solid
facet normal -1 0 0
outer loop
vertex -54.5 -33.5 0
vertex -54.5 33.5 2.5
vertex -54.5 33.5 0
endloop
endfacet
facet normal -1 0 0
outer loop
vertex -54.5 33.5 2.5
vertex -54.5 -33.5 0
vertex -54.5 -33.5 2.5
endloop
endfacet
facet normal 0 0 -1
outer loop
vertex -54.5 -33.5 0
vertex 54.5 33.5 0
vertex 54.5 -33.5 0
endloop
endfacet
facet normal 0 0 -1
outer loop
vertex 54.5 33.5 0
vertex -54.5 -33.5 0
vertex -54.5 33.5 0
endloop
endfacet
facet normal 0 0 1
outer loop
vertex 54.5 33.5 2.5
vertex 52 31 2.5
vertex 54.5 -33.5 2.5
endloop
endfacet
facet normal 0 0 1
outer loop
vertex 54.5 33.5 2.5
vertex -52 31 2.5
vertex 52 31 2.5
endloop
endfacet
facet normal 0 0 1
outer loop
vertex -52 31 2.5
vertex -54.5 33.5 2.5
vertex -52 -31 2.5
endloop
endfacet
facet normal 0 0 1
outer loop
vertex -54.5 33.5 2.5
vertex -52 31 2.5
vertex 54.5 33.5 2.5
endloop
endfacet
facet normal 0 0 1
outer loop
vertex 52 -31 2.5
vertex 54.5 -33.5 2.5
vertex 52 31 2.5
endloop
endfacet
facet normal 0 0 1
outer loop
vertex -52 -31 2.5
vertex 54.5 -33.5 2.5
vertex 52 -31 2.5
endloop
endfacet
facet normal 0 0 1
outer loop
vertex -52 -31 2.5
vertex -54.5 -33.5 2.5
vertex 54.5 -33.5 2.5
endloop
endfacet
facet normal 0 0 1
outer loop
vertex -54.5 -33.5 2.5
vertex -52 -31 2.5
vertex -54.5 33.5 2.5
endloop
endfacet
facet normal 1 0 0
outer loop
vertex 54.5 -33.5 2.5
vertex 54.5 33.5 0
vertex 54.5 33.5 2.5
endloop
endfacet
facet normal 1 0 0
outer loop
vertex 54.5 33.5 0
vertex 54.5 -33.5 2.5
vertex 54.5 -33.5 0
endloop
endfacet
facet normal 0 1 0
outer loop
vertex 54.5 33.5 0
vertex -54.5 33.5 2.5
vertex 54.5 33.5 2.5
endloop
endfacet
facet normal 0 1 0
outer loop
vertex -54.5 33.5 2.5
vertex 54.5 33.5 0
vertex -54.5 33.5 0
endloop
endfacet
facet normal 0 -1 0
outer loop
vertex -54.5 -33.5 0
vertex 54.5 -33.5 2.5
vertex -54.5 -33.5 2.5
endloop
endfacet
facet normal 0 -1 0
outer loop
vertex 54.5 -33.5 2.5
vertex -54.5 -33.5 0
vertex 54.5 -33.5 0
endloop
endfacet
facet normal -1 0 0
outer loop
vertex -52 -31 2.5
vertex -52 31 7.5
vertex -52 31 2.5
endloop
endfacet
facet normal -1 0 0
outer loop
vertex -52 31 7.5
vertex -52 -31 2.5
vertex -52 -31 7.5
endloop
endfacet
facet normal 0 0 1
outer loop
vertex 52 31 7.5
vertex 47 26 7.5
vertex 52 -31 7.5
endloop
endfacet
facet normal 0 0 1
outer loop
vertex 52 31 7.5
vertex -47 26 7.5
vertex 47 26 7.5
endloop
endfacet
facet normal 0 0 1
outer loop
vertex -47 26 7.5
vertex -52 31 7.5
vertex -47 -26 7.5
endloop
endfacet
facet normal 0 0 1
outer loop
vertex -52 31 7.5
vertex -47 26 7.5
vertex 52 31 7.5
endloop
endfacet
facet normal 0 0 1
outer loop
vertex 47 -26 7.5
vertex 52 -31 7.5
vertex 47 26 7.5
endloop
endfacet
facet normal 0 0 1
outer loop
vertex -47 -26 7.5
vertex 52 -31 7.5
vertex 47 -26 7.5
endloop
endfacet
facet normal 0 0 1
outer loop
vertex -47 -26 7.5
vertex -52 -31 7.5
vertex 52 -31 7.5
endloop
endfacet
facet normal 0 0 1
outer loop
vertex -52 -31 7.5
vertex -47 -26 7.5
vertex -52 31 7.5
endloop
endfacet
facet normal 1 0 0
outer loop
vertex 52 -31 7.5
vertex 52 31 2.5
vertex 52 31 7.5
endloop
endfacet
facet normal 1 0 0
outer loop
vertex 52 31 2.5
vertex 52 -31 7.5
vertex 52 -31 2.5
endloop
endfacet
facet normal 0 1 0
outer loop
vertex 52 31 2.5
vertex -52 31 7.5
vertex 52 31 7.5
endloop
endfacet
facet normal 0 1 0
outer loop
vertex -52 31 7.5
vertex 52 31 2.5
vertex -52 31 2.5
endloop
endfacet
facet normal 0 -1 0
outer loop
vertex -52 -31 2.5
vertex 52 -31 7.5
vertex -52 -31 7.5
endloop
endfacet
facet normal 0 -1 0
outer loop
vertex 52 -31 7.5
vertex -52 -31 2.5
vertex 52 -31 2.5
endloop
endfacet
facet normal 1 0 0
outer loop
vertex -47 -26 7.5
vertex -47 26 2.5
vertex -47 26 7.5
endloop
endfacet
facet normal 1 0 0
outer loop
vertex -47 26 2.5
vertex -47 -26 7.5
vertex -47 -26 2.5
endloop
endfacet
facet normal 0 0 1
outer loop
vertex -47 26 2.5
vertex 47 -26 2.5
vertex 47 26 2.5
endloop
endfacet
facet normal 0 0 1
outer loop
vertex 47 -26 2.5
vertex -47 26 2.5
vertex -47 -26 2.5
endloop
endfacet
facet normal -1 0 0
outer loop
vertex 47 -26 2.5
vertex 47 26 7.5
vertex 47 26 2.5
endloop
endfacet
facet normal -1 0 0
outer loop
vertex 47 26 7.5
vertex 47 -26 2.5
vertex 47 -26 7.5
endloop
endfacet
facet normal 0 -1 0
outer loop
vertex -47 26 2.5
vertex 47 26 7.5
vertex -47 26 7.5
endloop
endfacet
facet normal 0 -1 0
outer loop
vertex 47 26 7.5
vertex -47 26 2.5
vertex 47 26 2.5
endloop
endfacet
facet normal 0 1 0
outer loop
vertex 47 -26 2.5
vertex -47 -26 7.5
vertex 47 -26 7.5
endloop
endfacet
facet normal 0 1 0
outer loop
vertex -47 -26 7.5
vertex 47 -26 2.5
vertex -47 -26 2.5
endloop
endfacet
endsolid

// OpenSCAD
//*************************************
// Description:
// 
// A simple box for Lyre project
//
// Fabrication:
//
// print two half shells for one box
//
// Copyright CC-BY-SA Bob Cousins 2010
//
// Rev 2 add lid module
//*************************************

// assume all units are mm

//*************************************
// >>>>  Edit Parameters <<<<
 
// assume uniform wall thickness
wall = 2.5;

// inner dimenions
inner_x = 104;
inner_y = 62;
inner_z = 11;

// parameters for lid
lip_z = 5;
lip_width = 5;

//********* END ***********************


// Calculated dimensions
outer_x = inner_x + wall*2;
outer_y = inner_y + wall*2;
outer_z = inner_z + wall;

origin_x = outer_x / 2;
origin_y = outer_y / 2;
origin_z = 0;
//*************************************

// A simple U-shape tray
module box_shell()
{
	
    translate ([-origin_x, -origin_y, -origin_z])
    difference() 
    {
        cube([outer_x, outer_y, outer_z],
            center = false);

        translate ([wall,wall,wall]) 
            cube([inner_x, inner_y, inner_z+wall], 
                center = false);
    }
}

// A lid with lipped edge
module box_lid ()
{
	translate ([0,0,wall+lip_z])
	rotate ([0,180,0])
    translate ([-origin_x, -origin_y, -origin_z])
    
	difference() {

		union() {
		    translate ([0,0,lip_z])
	        cube([outer_x, outer_y, wall], center = false);
	
		    translate ([wall,wall,0])
	        cube([inner_x, inner_y, lip_z+wall/2], center = false);
		}

		translate ([wall+lip_width, wall+lip_width, -wall/2])
	        cube([inner_x - lip_width*2, 
                  inner_y - lip_width*2, 
                  lip_z+wall/2], center = false);

		
	}
}

// select module as required
//box_shell();

box_lid();
